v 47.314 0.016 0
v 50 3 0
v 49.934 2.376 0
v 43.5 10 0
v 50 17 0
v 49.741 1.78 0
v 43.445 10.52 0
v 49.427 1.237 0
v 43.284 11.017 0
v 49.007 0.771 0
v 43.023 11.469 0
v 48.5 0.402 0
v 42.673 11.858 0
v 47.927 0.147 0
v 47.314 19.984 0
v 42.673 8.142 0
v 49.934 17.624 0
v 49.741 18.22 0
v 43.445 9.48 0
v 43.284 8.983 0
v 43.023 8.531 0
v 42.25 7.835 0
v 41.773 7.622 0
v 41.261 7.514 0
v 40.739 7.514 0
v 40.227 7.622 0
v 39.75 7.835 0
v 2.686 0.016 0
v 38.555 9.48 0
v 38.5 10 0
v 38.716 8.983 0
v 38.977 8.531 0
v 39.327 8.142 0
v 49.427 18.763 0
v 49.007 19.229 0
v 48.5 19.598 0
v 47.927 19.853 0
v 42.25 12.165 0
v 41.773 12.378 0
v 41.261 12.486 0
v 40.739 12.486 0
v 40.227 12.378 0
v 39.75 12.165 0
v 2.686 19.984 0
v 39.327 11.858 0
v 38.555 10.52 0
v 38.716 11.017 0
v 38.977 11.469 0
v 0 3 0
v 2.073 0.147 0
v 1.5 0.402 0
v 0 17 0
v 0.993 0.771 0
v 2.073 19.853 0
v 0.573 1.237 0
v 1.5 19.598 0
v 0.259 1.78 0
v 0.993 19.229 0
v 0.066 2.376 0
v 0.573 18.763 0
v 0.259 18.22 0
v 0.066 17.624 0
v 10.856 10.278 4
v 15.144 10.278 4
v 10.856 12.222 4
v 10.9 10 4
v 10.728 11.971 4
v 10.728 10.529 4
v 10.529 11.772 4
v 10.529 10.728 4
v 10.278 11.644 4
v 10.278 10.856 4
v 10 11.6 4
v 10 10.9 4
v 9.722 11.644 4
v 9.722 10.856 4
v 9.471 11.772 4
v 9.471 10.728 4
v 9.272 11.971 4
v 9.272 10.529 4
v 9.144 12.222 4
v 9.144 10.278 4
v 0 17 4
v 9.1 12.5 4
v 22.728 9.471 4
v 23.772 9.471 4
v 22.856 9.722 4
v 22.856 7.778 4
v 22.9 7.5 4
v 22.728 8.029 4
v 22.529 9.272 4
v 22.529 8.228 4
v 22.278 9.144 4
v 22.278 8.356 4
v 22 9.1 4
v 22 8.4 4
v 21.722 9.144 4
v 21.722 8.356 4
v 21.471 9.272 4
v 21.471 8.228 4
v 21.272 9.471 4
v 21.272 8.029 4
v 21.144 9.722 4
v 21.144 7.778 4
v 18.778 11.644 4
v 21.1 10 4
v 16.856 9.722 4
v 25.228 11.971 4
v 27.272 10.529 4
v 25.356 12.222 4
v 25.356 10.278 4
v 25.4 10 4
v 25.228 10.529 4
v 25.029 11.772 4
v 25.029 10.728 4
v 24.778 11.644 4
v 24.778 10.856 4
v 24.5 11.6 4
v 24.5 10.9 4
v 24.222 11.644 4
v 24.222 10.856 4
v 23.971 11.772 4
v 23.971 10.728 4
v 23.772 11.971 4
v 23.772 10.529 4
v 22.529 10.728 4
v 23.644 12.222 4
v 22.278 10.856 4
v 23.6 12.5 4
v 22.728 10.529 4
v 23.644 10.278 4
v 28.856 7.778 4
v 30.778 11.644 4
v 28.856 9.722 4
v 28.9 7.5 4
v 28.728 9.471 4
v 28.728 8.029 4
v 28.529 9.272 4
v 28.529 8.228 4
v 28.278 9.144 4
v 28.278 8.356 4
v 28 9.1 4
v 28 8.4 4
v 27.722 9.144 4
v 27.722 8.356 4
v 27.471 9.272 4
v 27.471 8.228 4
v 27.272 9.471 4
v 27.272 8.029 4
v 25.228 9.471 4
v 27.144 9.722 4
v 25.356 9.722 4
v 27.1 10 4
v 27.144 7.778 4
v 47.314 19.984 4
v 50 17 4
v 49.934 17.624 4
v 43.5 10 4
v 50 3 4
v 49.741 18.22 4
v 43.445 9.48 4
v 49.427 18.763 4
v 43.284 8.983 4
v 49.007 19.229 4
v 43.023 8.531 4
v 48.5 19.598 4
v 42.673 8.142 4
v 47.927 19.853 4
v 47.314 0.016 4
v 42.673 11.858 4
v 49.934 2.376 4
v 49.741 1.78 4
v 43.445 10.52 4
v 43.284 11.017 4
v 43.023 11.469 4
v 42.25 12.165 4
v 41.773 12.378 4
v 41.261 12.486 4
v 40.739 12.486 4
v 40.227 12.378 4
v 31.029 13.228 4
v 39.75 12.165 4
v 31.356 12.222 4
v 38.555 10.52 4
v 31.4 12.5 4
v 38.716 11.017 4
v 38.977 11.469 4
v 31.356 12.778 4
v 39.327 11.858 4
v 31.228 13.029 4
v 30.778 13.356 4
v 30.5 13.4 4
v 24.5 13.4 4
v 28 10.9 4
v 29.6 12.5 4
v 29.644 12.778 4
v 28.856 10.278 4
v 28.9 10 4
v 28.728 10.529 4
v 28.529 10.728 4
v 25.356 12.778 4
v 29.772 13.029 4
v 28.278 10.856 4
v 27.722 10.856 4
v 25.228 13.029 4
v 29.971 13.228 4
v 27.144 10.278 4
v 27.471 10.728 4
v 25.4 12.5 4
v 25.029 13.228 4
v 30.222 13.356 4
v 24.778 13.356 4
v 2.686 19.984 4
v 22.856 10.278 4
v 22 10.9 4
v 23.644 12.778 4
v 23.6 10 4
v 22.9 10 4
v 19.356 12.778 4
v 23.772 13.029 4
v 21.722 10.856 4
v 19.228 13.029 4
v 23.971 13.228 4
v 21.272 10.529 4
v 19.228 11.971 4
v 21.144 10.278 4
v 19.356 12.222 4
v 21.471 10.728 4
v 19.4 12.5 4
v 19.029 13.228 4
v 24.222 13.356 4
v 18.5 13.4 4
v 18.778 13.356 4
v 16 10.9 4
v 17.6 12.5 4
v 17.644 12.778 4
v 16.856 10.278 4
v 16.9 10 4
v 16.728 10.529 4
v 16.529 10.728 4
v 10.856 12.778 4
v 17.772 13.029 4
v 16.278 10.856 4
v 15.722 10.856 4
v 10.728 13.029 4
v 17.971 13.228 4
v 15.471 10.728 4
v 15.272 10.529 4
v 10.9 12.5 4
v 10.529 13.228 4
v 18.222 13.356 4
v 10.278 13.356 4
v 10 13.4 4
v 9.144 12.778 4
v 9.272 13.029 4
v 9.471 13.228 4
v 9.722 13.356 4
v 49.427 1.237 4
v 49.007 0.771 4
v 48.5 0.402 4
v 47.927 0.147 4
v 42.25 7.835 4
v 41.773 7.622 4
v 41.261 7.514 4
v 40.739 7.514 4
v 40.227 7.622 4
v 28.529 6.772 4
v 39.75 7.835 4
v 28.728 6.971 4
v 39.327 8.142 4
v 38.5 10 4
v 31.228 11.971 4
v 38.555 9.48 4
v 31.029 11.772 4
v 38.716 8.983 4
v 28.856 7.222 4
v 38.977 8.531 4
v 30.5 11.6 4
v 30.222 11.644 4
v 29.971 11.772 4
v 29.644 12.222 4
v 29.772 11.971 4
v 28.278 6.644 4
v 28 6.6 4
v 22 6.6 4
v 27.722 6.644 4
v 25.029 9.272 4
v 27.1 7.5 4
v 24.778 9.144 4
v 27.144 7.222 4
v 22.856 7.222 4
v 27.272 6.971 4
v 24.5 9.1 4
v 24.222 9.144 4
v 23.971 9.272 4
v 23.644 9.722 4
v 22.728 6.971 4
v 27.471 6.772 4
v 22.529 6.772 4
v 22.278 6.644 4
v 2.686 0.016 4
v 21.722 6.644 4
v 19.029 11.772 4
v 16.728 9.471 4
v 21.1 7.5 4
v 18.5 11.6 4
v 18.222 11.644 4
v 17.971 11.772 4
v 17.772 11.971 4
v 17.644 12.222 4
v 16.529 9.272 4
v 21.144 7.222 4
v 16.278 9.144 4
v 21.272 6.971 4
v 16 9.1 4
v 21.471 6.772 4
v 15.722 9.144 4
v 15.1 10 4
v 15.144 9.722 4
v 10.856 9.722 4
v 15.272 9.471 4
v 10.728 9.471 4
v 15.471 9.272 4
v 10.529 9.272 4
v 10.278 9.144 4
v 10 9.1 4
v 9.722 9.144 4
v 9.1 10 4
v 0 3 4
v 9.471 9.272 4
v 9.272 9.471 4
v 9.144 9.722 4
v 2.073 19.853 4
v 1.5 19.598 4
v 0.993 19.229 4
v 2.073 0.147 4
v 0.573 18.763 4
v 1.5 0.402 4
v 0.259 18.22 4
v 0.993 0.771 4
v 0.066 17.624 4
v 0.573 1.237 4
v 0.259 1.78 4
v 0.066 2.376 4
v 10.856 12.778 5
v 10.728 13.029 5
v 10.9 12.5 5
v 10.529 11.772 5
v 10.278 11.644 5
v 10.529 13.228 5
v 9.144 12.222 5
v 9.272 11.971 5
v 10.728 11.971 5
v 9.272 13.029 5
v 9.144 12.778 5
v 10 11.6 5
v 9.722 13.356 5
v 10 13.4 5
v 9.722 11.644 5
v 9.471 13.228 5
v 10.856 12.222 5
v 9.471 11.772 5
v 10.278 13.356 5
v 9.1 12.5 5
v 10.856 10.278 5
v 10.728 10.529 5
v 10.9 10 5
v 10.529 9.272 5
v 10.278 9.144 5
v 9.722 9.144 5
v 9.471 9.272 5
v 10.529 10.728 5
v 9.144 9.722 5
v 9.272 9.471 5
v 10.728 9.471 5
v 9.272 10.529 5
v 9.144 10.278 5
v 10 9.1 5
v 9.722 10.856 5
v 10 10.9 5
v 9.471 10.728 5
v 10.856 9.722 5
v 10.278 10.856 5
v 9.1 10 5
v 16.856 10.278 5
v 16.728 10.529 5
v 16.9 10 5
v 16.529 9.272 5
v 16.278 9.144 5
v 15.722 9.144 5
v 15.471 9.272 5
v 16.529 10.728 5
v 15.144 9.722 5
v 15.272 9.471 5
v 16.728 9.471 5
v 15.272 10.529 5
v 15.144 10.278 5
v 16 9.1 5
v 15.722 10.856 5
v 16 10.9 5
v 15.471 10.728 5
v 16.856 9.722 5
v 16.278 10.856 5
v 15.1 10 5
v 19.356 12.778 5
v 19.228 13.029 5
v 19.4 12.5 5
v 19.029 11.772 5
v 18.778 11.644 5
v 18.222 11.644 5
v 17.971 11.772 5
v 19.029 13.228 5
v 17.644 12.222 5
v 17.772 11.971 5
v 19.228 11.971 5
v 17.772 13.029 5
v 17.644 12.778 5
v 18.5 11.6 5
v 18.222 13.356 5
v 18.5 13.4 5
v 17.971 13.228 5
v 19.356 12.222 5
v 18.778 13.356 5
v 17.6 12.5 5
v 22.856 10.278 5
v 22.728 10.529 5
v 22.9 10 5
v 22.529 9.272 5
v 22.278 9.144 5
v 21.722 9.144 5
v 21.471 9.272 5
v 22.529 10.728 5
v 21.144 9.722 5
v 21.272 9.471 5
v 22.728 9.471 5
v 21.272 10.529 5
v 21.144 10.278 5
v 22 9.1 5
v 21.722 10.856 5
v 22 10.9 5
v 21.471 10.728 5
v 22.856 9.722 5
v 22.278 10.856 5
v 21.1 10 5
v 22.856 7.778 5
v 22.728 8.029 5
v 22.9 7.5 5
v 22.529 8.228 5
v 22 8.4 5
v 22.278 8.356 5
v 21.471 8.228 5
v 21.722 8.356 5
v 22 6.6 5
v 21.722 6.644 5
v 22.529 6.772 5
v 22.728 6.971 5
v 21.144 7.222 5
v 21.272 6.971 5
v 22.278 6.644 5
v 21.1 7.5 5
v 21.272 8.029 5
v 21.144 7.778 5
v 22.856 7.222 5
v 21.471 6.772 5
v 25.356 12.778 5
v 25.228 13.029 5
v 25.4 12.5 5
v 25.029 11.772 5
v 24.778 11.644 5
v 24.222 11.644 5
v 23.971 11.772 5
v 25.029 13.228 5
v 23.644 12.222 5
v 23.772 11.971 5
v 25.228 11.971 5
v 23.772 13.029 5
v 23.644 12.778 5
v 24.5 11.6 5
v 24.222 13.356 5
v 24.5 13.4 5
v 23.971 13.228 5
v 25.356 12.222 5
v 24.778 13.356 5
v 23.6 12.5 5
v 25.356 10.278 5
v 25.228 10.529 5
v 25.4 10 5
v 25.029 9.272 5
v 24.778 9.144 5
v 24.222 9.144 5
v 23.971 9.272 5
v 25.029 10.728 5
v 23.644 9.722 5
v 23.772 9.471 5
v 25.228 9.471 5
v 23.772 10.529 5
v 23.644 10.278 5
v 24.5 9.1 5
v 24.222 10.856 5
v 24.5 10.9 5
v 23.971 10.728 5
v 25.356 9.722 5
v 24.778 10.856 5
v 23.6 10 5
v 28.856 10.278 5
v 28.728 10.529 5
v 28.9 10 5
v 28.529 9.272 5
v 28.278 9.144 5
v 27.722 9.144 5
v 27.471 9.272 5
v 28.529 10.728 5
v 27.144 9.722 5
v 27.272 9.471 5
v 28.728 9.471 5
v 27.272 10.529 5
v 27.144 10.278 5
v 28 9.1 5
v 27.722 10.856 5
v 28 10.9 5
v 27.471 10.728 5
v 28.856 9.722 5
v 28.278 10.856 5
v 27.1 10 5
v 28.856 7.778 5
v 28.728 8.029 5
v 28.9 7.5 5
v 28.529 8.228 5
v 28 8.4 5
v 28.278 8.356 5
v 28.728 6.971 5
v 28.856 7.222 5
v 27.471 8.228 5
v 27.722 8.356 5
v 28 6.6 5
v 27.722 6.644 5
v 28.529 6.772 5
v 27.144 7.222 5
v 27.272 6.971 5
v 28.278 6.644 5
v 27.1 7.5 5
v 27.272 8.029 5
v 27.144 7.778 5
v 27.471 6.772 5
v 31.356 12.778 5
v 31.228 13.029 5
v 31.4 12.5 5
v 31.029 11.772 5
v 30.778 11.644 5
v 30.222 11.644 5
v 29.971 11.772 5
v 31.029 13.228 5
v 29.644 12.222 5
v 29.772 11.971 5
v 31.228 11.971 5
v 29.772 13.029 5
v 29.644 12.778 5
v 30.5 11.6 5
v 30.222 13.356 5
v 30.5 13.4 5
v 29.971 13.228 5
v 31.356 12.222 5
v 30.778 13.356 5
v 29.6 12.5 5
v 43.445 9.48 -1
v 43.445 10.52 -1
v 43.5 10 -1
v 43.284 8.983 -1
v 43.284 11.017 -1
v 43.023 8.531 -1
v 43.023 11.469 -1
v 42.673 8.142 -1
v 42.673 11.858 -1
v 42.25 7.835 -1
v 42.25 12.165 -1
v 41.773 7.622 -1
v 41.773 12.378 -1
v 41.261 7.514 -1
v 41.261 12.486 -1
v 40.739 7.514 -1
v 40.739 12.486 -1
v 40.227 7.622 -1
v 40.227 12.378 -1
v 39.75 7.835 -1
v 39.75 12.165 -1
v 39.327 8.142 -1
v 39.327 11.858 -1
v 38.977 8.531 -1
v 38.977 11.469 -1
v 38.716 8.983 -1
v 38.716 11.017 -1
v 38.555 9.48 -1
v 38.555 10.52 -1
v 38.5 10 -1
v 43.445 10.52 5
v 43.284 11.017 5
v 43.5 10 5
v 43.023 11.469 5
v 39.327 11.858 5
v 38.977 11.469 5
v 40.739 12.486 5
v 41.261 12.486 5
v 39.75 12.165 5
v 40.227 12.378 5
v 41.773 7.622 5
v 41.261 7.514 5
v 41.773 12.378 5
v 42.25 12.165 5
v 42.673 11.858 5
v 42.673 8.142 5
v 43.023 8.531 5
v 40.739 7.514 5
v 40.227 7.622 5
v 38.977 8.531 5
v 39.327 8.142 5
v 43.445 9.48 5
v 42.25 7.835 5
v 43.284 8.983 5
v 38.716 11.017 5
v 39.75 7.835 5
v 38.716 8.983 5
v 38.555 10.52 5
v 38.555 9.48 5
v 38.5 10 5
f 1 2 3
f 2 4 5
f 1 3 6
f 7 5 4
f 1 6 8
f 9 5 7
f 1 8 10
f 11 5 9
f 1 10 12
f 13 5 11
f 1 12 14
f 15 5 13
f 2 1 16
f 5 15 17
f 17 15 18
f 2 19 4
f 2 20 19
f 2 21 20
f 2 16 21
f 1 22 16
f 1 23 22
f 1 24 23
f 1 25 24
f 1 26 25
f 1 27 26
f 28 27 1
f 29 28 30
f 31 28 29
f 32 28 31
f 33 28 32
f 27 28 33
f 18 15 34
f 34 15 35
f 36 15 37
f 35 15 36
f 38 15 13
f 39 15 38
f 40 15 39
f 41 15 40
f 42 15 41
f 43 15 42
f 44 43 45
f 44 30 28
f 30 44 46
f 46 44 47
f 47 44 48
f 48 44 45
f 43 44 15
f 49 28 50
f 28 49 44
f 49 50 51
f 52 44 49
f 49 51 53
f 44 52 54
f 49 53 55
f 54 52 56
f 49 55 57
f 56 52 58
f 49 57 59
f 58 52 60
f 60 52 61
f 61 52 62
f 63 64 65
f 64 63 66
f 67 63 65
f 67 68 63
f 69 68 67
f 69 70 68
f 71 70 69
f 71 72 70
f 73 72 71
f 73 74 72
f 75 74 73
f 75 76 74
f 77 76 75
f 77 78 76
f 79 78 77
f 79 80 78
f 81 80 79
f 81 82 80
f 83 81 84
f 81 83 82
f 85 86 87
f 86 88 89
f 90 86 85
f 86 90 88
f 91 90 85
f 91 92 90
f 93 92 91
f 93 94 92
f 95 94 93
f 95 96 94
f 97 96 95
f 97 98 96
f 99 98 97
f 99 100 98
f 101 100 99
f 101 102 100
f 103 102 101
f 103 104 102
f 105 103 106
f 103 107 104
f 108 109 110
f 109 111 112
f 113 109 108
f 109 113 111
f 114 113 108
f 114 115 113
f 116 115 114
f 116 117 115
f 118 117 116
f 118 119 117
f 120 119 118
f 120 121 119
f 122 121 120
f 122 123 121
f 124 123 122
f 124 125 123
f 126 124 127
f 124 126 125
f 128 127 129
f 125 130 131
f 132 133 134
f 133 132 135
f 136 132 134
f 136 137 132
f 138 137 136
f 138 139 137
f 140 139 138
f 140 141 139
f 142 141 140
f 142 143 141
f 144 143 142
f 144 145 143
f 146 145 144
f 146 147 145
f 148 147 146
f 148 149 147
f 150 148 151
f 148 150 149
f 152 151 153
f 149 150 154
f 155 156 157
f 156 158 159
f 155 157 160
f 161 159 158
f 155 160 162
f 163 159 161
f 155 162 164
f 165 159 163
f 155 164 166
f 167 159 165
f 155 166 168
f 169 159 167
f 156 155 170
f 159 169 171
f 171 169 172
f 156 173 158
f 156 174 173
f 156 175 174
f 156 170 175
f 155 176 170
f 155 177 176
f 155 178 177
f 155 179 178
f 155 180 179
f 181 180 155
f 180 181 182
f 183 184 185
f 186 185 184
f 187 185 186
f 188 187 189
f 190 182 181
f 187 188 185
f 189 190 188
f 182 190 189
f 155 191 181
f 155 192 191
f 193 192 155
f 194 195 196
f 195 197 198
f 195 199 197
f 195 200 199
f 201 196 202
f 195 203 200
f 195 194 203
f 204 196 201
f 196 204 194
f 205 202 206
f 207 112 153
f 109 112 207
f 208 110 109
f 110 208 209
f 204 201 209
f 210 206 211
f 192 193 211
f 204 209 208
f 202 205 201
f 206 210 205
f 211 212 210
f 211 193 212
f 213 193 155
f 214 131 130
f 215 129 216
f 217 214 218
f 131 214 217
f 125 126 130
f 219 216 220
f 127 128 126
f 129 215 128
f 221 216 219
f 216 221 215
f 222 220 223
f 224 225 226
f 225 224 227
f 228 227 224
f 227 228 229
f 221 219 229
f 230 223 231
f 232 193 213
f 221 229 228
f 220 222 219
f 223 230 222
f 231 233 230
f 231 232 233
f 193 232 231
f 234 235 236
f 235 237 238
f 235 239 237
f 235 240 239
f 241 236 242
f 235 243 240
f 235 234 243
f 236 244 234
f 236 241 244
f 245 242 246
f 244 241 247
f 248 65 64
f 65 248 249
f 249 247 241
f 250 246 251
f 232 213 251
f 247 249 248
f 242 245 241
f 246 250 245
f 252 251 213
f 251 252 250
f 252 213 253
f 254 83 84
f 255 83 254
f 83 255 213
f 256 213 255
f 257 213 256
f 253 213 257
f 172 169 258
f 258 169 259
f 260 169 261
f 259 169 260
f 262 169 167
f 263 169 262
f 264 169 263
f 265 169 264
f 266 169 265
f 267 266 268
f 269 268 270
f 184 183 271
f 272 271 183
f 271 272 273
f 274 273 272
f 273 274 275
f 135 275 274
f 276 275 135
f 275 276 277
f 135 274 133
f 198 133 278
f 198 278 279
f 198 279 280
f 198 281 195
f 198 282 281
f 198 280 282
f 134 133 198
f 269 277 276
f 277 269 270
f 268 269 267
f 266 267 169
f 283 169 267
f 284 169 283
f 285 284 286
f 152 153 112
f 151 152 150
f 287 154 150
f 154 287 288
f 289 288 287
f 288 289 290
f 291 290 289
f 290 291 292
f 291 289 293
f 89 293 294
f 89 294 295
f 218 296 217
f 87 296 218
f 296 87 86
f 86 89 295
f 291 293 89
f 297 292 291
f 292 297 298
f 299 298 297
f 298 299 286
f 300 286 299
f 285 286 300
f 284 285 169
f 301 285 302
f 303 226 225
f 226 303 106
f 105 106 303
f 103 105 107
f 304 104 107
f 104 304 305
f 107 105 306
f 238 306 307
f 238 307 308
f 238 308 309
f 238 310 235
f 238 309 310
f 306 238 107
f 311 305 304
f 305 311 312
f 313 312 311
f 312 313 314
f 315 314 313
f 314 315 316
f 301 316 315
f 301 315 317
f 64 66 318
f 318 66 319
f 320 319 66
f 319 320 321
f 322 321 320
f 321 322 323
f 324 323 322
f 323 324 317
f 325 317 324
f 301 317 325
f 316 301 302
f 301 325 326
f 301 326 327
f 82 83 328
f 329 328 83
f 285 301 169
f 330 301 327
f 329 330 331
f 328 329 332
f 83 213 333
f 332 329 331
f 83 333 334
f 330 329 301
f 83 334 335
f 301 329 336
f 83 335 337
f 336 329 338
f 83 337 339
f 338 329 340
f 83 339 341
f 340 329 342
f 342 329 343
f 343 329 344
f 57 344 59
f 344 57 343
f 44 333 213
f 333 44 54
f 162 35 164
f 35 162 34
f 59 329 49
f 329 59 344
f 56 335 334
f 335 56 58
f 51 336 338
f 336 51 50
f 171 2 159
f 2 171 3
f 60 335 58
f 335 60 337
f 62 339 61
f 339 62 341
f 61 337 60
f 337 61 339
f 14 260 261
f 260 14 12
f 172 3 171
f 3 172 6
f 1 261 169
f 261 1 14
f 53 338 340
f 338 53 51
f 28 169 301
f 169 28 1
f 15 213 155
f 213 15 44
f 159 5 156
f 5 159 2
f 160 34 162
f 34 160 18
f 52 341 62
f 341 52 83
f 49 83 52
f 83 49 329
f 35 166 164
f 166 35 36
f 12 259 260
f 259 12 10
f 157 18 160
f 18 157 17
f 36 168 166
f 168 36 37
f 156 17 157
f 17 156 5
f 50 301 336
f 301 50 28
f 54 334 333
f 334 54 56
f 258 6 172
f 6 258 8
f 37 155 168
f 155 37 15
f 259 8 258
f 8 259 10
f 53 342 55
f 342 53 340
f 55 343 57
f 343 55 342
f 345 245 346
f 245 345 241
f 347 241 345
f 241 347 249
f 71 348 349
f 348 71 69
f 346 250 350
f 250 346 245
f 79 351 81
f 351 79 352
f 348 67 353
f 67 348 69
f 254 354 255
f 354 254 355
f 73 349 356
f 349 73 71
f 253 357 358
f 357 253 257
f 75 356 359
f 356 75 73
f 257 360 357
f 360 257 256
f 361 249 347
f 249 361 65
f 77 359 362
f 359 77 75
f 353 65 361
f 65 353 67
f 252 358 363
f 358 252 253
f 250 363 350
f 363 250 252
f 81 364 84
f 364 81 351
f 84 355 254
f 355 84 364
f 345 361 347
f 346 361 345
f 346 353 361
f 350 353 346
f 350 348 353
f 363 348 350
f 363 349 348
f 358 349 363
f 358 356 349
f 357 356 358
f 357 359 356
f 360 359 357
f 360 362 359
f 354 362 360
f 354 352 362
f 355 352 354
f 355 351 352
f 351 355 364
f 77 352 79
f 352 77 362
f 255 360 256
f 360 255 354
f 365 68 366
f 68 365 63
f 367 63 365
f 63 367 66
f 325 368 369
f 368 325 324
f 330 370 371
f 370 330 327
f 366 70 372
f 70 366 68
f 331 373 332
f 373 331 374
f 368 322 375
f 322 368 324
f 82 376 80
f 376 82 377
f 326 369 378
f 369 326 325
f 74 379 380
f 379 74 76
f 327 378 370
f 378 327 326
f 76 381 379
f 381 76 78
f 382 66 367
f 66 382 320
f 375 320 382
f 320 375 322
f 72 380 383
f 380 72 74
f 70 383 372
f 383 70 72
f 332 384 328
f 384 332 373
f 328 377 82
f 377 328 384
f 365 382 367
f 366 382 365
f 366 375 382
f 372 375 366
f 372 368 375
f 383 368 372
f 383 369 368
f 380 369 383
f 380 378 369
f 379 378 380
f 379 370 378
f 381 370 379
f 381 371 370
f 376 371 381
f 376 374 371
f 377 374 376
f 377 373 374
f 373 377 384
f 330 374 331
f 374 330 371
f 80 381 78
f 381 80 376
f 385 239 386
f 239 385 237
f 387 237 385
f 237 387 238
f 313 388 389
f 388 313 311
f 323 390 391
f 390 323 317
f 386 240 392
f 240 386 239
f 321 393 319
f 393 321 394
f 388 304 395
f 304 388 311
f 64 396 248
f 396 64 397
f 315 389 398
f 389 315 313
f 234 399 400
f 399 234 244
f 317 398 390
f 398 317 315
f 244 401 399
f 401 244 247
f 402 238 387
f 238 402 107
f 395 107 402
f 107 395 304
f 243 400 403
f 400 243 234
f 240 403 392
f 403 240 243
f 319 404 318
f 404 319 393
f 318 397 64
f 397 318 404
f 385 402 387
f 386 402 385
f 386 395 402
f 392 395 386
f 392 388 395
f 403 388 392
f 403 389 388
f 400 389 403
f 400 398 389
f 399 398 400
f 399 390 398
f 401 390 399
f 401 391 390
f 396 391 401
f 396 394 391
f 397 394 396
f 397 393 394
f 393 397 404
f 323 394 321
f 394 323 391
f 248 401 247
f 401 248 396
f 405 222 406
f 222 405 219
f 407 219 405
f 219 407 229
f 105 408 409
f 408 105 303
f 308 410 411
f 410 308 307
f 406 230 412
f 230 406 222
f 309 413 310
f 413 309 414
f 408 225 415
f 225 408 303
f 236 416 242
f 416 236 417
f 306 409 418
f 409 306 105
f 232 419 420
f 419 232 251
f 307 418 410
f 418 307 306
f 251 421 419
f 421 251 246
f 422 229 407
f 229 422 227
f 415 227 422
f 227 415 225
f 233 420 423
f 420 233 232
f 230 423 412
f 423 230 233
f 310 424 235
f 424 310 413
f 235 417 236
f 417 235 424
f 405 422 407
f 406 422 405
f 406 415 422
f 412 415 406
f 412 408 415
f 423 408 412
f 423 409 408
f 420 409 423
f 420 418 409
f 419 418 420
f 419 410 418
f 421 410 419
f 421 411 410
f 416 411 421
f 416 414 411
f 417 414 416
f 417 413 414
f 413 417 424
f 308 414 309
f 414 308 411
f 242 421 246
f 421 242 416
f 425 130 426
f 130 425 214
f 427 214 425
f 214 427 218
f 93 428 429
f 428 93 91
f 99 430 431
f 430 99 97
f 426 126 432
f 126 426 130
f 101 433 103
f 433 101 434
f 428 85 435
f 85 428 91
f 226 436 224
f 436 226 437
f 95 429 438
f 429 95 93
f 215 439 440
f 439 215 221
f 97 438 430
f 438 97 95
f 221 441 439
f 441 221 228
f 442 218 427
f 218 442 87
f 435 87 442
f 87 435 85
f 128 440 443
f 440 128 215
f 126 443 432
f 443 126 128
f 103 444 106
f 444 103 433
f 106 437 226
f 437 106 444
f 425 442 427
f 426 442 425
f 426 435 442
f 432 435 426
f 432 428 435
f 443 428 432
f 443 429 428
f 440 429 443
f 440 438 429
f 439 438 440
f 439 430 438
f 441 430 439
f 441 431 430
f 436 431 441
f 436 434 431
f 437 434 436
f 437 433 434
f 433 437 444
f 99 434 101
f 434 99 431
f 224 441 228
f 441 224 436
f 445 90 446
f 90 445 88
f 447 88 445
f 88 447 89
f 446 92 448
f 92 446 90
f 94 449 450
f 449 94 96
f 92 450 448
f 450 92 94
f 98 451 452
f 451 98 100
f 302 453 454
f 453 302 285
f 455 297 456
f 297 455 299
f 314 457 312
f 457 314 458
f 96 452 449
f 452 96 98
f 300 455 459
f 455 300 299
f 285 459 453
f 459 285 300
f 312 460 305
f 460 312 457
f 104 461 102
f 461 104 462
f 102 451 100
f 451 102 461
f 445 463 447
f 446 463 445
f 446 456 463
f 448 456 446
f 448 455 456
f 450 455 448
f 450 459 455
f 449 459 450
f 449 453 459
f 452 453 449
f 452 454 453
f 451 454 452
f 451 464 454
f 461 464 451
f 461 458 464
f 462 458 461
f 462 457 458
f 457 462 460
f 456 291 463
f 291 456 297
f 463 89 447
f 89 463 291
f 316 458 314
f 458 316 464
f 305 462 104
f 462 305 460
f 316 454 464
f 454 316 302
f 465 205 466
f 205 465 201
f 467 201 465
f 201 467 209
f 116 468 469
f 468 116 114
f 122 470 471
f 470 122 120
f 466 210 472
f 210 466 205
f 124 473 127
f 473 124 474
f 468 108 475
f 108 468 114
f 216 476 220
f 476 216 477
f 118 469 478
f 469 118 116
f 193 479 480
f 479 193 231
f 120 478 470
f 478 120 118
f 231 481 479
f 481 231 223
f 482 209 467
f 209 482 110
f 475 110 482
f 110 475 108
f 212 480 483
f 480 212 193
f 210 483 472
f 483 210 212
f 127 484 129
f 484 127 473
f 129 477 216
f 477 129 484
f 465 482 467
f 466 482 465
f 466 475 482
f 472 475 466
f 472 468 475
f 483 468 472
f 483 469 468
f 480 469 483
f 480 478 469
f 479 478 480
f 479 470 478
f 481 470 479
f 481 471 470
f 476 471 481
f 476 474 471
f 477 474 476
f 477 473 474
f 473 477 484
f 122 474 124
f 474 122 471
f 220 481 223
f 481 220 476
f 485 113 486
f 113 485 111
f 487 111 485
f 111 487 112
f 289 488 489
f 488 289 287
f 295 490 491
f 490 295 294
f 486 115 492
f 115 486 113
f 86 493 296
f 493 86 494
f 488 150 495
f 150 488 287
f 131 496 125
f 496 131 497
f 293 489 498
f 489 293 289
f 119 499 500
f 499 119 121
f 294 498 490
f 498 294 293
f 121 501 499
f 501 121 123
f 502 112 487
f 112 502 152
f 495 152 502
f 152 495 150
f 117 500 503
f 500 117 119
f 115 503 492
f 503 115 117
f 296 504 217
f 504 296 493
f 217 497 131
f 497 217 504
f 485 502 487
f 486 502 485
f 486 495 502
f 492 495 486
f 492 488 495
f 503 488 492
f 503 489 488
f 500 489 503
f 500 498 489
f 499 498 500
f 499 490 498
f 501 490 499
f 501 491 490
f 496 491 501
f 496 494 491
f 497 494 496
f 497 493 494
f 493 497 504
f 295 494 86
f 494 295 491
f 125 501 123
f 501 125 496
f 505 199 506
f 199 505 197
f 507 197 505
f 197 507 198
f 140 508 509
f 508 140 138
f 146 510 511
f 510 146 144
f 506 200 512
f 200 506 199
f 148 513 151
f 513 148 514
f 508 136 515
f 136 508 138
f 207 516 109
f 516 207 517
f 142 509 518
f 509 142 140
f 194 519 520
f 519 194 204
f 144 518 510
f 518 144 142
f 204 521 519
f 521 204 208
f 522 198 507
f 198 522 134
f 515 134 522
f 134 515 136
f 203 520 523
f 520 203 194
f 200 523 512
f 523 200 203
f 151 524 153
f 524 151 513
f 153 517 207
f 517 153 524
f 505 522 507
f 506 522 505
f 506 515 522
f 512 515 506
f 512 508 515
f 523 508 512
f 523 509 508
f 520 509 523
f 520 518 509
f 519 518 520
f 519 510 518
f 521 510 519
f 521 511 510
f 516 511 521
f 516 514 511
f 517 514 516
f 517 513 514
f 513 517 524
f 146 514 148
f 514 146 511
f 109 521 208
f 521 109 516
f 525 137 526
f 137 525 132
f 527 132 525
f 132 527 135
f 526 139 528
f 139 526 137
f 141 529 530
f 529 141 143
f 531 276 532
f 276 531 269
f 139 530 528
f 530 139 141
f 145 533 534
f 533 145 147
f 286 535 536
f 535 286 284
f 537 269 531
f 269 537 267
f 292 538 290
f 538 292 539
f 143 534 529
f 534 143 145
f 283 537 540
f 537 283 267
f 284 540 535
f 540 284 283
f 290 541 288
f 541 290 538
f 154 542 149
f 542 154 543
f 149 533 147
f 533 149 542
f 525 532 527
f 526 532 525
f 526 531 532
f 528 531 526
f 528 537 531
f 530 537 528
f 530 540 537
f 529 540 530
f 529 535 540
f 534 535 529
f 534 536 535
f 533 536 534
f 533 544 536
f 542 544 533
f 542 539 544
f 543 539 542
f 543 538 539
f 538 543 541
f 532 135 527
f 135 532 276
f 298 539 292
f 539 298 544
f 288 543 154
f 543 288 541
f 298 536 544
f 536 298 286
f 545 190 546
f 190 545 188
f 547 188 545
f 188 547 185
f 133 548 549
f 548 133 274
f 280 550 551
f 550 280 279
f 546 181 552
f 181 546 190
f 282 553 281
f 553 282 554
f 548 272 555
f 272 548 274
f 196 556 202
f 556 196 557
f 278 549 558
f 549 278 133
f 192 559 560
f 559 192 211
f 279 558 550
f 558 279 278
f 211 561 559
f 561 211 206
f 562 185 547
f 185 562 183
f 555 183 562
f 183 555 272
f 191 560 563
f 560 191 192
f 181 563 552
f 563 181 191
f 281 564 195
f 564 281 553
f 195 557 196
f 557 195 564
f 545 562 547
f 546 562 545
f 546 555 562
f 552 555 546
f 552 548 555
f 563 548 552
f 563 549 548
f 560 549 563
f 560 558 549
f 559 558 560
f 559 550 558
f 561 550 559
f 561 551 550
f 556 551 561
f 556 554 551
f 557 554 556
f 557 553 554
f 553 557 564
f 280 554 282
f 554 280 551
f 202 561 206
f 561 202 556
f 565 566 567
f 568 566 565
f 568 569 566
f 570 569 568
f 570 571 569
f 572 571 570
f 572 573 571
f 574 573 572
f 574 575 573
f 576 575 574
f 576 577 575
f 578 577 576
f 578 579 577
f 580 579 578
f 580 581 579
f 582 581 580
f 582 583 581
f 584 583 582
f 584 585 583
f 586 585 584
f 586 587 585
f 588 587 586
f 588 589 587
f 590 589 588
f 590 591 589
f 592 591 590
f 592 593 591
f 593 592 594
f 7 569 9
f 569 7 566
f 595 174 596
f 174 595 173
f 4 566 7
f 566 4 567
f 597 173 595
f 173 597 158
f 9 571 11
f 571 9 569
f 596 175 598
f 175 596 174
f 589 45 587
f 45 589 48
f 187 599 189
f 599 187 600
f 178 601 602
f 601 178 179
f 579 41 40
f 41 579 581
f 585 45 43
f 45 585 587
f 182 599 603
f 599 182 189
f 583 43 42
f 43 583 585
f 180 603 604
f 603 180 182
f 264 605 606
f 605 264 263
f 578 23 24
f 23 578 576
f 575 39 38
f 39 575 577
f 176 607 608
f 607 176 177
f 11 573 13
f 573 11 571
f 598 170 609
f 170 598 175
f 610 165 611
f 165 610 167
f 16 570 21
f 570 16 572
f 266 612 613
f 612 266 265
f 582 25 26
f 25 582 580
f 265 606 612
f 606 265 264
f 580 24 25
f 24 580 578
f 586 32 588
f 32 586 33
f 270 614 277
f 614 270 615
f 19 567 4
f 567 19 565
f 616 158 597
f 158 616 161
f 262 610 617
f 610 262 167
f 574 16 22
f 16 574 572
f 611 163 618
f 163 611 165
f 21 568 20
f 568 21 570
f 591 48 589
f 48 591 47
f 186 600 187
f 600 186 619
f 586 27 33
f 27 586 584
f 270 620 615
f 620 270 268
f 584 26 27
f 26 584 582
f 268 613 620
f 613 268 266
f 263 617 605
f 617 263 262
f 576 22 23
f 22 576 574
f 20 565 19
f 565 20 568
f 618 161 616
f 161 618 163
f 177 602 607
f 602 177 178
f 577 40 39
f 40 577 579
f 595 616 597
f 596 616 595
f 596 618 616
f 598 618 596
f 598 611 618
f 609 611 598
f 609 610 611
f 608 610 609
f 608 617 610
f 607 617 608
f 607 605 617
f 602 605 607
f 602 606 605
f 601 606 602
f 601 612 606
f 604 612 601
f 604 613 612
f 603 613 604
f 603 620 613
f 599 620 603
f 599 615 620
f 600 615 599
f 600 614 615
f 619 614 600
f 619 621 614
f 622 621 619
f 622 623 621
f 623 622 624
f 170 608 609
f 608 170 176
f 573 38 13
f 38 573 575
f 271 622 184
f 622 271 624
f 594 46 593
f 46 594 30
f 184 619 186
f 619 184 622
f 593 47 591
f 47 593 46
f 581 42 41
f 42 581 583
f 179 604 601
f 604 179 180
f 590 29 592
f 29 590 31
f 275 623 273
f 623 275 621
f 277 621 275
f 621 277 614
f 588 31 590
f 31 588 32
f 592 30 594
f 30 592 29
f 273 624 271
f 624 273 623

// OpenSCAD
// Braille Keychain with "bits" text
// Created on April 2, 2025

// Keychain base parameters
base_width = 50;
base_height = 20;
base_thickness = 4;
corner_radius = 3;

// Braille dot parameters
dot_diameter = 1.8;
dot_height = 1;
dot_spacing_x = 2.5;  // Horizontal spacing between dots in same character
dot_spacing_y = 2.5;  // Vertical spacing between dots in same character
char_spacing = 6;     // Spacing between characters

// Keychain loop parameters
loop_outer_diameter = 8;  // Outer diameter of the keyloop
loop_inner_diameter = 5;  // Inner diameter of the keyloop (hole)
loop_offset = 5;          // Distance from the edge

// Braille patterns for "bits"
// Braille uses 2×3 grid of dots, numbered:
// 1 4
// 2 5
// 3 6
//
// b: dots 1,2
// i: dots 2,4
// t: dots 2,3,4,5
// s: dots 2,3,4

// Module to create rounded rectangle base for keychain
module rounded_rectangle(width, height, radius, thickness) {
    linear_extrude(height = thickness) {
        hull() {
            translate([radius, radius, 0])
                circle(r = radius, $fn = 30);
            
            translate([width - radius, radius, 0])
                circle(r = radius, $fn = 30);
            
            translate([radius, height - radius, 0])
                circle(r = radius, $fn = 30);
            
            translate([width - radius, height - radius, 0])
                circle(r = radius, $fn = 30);
        }
    }
}

// Module to create a single braille dot
module braille_dot() {
    cylinder(h = dot_height, d = dot_diameter, $fn = 20);
}

// Module to create a braille character based on dot pattern
module braille_char(dots) {
    for (i = [0 : len(dots) - 1]) {
        dot = dots[i];
        
        // Calculate position based on dot number (1-6)
        x = (dot == 4 || dot == 5 || dot == 6) ? dot_spacing_x : 0;
        y = (dot == 1 || dot == 4) ? dot_spacing_y * 2 : 
            ((dot == 2 || dot == 5) ? dot_spacing_y : 0);
            
        translate([x, y, 0])
            braille_dot();
    }
}

// Module to create the keychain loop
module keychain_loop() {
    difference() {
        // Outer cylinder for the loop
        cylinder(h = base_thickness, d = loop_outer_diameter, $fn = 30);
        
        // Inner cylinder to create the hole - ensure it goes through completely
        translate([0, 0, -1])
            cylinder(h = base_thickness + 2, d = loop_inner_diameter, $fn = 30);
    }
}

// Main module to create the entire keychain
module braille_keychain() {
    // Create the base with the loop as a single solid piece
    union() {
        // Base plate with rounded corners
        rounded_rectangle(base_width, base_height, corner_radius, base_thickness);
        
        // Add keychain loop - ensure it connects properly to the base
        translate([base_width - loop_offset - loop_outer_diameter/2, base_height/2, 0])
            keychain_loop();
    }
    
    // Create the hole for the keychain loop as a separate operation to ensure it's visible
    translate([base_width - loop_offset - loop_outer_diameter/2, base_height/2, -1])
        cylinder(h = base_thickness + 2, d = loop_inner_diameter, $fn = 30);
    
    // Starting position for the first character
    start_x = 10;
    start_y = base_height/2 - dot_spacing_y;
    
    // Add braille characters for "bits"
    // b: dots 1,2
    translate([start_x, start_y, base_thickness])
        braille_char([1, 2]);
    
    // i: dots 2,4
    translate([start_x + char_spacing, start_y, base_thickness])
        braille_char([2, 4]);
    
    // t: dots 2,3,4,5
    translate([start_x + char_spacing*2, start_y, base_thickness])
        braille_char([2, 3, 4, 5]);
    
    // s: dots 2,3,4
    translate([start_x + char_spacing*3, start_y, base_thickness])
        braille_char([2, 3, 4]);
}

// Render the keychain
braille_keychain();
